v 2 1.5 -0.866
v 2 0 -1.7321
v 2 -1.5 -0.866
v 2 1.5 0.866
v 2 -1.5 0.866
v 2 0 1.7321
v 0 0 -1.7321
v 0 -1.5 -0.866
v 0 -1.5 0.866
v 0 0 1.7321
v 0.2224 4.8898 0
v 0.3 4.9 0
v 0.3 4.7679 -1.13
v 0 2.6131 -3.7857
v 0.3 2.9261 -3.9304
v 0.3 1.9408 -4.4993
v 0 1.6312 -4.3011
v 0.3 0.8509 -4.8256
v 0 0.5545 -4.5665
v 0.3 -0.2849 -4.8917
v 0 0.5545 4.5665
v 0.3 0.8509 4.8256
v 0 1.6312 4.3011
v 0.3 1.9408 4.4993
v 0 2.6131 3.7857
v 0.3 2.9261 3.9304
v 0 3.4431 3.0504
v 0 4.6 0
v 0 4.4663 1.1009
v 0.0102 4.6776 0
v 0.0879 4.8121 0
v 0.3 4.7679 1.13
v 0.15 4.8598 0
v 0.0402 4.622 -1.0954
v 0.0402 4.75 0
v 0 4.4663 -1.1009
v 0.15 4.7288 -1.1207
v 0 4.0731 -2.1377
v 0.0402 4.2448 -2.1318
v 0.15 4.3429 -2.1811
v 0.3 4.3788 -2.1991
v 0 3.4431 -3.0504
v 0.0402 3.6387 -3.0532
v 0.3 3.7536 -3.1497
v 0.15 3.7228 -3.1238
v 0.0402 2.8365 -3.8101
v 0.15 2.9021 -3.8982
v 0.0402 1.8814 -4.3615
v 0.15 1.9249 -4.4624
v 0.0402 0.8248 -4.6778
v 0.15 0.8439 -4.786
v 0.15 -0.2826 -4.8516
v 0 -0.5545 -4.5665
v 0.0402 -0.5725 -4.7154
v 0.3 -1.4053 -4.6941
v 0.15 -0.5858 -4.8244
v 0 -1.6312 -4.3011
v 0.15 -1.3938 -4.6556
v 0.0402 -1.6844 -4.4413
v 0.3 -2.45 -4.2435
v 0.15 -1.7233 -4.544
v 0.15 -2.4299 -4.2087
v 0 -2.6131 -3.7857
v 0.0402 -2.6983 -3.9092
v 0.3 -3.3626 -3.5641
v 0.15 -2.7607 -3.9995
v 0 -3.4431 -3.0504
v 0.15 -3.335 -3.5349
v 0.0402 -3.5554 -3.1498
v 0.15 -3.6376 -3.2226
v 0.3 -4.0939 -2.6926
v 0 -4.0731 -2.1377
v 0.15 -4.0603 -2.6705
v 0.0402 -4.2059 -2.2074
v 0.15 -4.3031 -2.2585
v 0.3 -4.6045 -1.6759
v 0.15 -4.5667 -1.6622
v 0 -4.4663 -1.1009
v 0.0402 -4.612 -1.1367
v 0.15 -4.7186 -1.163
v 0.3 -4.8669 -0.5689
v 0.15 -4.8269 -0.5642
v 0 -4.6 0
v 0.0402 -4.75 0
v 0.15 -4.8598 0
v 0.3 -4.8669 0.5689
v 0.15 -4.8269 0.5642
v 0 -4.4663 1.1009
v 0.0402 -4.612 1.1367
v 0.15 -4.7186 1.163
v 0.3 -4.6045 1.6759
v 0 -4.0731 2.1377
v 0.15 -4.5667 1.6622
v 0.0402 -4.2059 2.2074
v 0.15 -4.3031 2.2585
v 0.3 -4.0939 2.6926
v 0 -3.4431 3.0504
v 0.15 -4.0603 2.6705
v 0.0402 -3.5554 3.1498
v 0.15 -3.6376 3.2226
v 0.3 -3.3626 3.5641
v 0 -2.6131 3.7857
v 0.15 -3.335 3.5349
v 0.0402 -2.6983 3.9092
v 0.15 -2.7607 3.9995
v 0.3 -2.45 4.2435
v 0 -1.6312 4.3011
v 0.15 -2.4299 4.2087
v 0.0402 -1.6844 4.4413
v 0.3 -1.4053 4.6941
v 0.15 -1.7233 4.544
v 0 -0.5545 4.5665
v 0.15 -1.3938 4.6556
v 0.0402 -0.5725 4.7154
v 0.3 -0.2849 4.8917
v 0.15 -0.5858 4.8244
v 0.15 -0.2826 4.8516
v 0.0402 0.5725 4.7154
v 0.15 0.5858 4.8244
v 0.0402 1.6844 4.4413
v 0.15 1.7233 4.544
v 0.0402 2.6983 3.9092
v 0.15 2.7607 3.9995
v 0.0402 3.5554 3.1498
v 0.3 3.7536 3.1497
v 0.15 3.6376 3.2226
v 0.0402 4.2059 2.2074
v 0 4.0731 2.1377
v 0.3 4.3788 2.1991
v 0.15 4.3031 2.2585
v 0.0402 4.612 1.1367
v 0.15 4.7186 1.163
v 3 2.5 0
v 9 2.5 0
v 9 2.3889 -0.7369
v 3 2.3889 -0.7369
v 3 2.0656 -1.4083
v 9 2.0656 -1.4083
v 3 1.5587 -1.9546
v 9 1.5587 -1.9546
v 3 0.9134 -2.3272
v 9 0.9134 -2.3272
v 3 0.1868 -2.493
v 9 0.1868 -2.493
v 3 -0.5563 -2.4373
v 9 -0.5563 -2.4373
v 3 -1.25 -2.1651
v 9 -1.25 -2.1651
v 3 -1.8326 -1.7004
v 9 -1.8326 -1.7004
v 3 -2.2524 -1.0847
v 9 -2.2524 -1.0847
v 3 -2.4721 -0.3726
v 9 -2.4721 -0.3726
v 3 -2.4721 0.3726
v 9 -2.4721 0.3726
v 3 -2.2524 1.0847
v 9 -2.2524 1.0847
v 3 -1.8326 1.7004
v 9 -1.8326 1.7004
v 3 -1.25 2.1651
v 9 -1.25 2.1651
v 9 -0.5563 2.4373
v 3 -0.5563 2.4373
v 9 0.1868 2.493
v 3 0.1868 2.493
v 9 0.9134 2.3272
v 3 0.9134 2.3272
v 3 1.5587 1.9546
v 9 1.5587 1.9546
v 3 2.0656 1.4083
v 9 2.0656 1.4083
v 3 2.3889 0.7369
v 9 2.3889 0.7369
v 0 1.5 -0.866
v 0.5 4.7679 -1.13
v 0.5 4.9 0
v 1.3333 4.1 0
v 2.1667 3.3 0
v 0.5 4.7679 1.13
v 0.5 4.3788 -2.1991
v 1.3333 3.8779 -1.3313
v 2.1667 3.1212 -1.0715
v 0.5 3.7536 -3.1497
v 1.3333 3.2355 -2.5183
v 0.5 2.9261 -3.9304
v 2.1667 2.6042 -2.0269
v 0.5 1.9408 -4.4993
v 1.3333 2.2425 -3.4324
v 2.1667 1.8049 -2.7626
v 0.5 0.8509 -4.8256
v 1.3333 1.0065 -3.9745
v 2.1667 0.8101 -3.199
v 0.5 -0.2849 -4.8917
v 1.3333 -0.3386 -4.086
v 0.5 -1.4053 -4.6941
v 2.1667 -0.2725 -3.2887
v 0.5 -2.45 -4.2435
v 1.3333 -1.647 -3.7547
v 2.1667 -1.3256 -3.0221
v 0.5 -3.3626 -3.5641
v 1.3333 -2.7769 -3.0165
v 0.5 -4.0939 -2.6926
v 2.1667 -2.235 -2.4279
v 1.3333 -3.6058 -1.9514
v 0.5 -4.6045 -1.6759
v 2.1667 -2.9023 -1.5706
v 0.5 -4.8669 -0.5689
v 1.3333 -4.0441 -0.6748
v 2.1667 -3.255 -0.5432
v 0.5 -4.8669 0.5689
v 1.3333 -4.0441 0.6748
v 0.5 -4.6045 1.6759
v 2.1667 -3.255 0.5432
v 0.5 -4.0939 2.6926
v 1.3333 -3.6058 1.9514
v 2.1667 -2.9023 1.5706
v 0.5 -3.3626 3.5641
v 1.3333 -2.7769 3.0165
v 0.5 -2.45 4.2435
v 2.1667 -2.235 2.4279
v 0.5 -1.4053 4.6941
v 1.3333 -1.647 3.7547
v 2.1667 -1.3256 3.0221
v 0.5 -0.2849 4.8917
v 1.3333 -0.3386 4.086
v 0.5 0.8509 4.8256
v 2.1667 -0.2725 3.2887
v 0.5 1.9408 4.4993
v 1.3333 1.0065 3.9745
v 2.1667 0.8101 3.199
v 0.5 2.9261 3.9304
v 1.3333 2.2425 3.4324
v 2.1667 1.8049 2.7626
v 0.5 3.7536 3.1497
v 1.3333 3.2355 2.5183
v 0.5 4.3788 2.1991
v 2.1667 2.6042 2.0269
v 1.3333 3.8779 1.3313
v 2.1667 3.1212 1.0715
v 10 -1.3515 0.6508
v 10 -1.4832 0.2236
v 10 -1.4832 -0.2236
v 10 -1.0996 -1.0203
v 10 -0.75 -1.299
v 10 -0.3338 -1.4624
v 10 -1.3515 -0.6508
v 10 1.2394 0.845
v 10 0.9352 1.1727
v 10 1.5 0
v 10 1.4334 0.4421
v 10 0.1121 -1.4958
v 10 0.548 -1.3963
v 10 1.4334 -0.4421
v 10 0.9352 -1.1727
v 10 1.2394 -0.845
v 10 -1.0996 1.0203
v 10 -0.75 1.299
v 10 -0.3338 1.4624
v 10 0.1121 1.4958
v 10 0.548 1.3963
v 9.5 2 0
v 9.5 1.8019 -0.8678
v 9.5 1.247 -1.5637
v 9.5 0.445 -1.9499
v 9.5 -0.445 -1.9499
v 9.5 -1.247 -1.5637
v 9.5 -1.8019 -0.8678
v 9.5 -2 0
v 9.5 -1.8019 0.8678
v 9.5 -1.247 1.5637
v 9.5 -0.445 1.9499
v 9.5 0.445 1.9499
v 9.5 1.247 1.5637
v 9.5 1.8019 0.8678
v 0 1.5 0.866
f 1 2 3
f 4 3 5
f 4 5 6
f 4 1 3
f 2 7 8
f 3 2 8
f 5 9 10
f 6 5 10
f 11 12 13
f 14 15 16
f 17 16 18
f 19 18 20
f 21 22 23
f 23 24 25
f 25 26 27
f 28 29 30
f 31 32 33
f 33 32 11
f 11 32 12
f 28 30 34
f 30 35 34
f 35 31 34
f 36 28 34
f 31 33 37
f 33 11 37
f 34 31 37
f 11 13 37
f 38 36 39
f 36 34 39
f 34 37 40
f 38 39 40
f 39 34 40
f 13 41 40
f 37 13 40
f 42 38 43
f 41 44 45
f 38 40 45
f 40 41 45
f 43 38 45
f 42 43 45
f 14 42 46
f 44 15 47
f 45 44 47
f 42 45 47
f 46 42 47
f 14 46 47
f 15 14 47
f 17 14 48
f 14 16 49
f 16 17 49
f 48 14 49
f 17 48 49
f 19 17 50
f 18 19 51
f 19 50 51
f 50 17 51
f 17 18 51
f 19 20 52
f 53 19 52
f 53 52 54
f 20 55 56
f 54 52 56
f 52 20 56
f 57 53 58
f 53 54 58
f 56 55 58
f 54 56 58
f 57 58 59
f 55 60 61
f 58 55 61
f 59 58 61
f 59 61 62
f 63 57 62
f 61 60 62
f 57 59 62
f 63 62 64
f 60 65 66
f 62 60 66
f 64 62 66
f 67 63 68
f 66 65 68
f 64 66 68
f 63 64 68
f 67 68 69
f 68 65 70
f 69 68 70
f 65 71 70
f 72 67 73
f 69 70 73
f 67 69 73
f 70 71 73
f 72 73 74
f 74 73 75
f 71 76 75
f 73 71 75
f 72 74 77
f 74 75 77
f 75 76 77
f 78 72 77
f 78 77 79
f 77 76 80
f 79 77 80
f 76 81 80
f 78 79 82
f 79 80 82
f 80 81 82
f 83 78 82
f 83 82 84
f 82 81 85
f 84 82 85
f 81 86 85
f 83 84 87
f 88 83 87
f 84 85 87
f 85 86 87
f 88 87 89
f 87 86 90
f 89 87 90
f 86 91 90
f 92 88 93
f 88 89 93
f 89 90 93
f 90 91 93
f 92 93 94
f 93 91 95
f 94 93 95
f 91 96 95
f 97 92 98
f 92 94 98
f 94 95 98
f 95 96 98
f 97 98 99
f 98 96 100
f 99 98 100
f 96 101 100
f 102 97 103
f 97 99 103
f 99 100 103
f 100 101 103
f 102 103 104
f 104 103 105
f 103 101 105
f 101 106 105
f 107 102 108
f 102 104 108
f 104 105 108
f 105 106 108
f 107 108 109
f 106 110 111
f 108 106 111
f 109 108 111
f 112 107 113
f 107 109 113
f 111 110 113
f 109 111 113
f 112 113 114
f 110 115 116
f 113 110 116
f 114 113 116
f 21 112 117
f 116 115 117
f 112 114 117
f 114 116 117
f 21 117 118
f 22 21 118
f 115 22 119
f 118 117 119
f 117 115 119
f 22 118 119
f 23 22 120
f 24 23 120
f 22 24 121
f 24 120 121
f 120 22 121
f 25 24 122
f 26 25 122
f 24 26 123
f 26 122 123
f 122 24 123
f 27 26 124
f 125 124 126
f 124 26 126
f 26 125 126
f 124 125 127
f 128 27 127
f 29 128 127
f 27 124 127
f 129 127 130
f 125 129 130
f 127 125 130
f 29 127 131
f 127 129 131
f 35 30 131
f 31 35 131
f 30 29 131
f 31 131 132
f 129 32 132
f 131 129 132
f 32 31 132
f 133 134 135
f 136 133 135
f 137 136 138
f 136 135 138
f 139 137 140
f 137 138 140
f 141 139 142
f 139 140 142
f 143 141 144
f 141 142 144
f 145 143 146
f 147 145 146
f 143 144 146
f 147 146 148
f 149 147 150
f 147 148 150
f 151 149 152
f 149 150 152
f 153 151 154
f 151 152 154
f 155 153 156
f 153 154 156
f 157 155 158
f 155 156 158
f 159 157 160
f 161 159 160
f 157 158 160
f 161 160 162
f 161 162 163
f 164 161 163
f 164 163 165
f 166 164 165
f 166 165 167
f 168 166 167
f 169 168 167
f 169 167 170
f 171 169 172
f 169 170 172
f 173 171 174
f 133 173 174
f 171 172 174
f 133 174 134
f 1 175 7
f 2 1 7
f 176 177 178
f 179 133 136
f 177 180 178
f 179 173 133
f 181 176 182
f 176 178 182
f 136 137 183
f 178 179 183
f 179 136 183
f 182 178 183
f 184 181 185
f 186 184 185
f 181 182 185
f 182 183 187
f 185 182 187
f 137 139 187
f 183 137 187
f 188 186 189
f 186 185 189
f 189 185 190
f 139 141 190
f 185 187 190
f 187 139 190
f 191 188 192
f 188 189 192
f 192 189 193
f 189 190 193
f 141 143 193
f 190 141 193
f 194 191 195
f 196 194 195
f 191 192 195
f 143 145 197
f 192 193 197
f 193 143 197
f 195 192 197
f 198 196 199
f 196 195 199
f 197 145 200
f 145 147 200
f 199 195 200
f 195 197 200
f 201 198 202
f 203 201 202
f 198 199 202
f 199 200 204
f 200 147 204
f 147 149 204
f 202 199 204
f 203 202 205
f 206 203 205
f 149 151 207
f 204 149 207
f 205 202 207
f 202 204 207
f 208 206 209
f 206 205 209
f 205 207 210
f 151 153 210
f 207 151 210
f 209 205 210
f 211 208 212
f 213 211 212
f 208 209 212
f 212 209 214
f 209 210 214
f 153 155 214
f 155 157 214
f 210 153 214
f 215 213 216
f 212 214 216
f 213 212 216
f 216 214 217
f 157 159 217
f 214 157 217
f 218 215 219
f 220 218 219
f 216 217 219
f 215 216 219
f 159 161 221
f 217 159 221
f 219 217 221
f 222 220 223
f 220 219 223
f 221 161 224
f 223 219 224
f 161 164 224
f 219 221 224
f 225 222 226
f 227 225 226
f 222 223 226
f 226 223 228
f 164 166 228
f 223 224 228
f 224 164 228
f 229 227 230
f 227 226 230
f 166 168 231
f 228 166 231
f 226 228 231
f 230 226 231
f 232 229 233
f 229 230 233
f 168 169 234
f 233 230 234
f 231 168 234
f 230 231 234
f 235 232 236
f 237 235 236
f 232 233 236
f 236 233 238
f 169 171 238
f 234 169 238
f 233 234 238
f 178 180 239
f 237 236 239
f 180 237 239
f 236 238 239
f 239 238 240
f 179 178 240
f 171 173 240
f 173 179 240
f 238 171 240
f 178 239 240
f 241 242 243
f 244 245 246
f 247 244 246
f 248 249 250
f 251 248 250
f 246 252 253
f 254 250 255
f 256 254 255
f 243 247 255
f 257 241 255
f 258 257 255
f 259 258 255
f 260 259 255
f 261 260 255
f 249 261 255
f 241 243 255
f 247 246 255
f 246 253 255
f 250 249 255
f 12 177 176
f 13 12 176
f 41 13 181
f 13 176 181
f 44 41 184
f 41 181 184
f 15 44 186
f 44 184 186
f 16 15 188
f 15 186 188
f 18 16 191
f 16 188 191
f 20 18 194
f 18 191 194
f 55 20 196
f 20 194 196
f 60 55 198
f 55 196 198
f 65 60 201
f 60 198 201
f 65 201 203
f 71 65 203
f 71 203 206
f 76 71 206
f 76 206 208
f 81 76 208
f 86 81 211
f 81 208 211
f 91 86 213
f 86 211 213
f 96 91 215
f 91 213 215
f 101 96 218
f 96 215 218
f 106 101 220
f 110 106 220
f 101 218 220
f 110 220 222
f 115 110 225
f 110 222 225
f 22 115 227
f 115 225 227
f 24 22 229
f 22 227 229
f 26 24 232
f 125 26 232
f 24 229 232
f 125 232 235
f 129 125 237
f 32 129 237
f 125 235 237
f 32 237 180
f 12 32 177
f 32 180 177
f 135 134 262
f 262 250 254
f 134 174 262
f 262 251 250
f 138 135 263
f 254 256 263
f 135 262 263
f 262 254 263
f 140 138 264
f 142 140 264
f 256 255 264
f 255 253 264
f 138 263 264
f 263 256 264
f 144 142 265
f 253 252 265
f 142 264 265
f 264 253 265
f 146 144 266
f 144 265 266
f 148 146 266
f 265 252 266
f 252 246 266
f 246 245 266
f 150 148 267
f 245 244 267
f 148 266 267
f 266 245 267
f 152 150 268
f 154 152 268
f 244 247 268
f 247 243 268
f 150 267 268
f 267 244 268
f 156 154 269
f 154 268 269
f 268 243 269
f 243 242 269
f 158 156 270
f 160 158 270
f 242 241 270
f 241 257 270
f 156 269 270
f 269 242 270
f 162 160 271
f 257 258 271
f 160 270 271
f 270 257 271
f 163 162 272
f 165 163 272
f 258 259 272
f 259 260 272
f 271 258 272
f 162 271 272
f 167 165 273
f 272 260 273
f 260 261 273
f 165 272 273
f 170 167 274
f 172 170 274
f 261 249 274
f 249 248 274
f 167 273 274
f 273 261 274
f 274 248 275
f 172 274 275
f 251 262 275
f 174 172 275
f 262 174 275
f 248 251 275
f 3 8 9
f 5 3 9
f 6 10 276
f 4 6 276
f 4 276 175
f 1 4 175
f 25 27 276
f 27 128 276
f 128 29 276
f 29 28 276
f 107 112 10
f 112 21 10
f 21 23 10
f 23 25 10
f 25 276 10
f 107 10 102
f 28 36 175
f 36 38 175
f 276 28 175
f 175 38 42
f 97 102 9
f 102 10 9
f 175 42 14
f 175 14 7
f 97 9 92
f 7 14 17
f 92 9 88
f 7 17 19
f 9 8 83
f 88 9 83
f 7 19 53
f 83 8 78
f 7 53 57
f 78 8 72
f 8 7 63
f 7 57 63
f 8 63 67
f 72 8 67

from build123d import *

# Parameters (mm, degrees)
CUT_EXTRUDE_1_DEPTH = 2
FILLET_1_R          = 0.3
CHAMFER_1_SIZE      = 1


with BuildPart() as part:
    # Эскиз1 → Повернуть1 (revolve)
    with BuildSketch(Plane.XY):
        Polygon((0, 0), (0, 4.9), (0.5, 4.9), (3, 2.5), (10, 2.5), (10, 0), align=None)
    revolve(axis=Axis((10, 0, 0), (-1, 0, 0)))

    # Эскиз2 → Вырез-Вытянуть1 (cut)
    with BuildSketch(Plane.ZY):
        Polygon((0.866025404, 1.5), (-0.866025404, 1.5), (-1.732050808, 0), (-0.866025404, -1.5), (0.866025404, -1.5), (1.732050808, 0), align=None)
    extrude(amount=-CUT_EXTRUDE_1_DEPTH, mode=Mode.SUBTRACT)

    # Скругление1
    fillet_1_edges = [part.edges().sort_by_distance(p)[0] for p in [
        (0, -4.9, 0),
    ]]
    fillet(fillet_1_edges, radius=FILLET_1_R)

    # Фаска1
    chamfer_1_edges = [part.edges().sort_by_distance(p)[0] for p in [
        (10, -2.5, 0),
    ]]
    chamfer(chamfer_1_edges, length=CHAMFER_1_SIZE)


solid = part.part
